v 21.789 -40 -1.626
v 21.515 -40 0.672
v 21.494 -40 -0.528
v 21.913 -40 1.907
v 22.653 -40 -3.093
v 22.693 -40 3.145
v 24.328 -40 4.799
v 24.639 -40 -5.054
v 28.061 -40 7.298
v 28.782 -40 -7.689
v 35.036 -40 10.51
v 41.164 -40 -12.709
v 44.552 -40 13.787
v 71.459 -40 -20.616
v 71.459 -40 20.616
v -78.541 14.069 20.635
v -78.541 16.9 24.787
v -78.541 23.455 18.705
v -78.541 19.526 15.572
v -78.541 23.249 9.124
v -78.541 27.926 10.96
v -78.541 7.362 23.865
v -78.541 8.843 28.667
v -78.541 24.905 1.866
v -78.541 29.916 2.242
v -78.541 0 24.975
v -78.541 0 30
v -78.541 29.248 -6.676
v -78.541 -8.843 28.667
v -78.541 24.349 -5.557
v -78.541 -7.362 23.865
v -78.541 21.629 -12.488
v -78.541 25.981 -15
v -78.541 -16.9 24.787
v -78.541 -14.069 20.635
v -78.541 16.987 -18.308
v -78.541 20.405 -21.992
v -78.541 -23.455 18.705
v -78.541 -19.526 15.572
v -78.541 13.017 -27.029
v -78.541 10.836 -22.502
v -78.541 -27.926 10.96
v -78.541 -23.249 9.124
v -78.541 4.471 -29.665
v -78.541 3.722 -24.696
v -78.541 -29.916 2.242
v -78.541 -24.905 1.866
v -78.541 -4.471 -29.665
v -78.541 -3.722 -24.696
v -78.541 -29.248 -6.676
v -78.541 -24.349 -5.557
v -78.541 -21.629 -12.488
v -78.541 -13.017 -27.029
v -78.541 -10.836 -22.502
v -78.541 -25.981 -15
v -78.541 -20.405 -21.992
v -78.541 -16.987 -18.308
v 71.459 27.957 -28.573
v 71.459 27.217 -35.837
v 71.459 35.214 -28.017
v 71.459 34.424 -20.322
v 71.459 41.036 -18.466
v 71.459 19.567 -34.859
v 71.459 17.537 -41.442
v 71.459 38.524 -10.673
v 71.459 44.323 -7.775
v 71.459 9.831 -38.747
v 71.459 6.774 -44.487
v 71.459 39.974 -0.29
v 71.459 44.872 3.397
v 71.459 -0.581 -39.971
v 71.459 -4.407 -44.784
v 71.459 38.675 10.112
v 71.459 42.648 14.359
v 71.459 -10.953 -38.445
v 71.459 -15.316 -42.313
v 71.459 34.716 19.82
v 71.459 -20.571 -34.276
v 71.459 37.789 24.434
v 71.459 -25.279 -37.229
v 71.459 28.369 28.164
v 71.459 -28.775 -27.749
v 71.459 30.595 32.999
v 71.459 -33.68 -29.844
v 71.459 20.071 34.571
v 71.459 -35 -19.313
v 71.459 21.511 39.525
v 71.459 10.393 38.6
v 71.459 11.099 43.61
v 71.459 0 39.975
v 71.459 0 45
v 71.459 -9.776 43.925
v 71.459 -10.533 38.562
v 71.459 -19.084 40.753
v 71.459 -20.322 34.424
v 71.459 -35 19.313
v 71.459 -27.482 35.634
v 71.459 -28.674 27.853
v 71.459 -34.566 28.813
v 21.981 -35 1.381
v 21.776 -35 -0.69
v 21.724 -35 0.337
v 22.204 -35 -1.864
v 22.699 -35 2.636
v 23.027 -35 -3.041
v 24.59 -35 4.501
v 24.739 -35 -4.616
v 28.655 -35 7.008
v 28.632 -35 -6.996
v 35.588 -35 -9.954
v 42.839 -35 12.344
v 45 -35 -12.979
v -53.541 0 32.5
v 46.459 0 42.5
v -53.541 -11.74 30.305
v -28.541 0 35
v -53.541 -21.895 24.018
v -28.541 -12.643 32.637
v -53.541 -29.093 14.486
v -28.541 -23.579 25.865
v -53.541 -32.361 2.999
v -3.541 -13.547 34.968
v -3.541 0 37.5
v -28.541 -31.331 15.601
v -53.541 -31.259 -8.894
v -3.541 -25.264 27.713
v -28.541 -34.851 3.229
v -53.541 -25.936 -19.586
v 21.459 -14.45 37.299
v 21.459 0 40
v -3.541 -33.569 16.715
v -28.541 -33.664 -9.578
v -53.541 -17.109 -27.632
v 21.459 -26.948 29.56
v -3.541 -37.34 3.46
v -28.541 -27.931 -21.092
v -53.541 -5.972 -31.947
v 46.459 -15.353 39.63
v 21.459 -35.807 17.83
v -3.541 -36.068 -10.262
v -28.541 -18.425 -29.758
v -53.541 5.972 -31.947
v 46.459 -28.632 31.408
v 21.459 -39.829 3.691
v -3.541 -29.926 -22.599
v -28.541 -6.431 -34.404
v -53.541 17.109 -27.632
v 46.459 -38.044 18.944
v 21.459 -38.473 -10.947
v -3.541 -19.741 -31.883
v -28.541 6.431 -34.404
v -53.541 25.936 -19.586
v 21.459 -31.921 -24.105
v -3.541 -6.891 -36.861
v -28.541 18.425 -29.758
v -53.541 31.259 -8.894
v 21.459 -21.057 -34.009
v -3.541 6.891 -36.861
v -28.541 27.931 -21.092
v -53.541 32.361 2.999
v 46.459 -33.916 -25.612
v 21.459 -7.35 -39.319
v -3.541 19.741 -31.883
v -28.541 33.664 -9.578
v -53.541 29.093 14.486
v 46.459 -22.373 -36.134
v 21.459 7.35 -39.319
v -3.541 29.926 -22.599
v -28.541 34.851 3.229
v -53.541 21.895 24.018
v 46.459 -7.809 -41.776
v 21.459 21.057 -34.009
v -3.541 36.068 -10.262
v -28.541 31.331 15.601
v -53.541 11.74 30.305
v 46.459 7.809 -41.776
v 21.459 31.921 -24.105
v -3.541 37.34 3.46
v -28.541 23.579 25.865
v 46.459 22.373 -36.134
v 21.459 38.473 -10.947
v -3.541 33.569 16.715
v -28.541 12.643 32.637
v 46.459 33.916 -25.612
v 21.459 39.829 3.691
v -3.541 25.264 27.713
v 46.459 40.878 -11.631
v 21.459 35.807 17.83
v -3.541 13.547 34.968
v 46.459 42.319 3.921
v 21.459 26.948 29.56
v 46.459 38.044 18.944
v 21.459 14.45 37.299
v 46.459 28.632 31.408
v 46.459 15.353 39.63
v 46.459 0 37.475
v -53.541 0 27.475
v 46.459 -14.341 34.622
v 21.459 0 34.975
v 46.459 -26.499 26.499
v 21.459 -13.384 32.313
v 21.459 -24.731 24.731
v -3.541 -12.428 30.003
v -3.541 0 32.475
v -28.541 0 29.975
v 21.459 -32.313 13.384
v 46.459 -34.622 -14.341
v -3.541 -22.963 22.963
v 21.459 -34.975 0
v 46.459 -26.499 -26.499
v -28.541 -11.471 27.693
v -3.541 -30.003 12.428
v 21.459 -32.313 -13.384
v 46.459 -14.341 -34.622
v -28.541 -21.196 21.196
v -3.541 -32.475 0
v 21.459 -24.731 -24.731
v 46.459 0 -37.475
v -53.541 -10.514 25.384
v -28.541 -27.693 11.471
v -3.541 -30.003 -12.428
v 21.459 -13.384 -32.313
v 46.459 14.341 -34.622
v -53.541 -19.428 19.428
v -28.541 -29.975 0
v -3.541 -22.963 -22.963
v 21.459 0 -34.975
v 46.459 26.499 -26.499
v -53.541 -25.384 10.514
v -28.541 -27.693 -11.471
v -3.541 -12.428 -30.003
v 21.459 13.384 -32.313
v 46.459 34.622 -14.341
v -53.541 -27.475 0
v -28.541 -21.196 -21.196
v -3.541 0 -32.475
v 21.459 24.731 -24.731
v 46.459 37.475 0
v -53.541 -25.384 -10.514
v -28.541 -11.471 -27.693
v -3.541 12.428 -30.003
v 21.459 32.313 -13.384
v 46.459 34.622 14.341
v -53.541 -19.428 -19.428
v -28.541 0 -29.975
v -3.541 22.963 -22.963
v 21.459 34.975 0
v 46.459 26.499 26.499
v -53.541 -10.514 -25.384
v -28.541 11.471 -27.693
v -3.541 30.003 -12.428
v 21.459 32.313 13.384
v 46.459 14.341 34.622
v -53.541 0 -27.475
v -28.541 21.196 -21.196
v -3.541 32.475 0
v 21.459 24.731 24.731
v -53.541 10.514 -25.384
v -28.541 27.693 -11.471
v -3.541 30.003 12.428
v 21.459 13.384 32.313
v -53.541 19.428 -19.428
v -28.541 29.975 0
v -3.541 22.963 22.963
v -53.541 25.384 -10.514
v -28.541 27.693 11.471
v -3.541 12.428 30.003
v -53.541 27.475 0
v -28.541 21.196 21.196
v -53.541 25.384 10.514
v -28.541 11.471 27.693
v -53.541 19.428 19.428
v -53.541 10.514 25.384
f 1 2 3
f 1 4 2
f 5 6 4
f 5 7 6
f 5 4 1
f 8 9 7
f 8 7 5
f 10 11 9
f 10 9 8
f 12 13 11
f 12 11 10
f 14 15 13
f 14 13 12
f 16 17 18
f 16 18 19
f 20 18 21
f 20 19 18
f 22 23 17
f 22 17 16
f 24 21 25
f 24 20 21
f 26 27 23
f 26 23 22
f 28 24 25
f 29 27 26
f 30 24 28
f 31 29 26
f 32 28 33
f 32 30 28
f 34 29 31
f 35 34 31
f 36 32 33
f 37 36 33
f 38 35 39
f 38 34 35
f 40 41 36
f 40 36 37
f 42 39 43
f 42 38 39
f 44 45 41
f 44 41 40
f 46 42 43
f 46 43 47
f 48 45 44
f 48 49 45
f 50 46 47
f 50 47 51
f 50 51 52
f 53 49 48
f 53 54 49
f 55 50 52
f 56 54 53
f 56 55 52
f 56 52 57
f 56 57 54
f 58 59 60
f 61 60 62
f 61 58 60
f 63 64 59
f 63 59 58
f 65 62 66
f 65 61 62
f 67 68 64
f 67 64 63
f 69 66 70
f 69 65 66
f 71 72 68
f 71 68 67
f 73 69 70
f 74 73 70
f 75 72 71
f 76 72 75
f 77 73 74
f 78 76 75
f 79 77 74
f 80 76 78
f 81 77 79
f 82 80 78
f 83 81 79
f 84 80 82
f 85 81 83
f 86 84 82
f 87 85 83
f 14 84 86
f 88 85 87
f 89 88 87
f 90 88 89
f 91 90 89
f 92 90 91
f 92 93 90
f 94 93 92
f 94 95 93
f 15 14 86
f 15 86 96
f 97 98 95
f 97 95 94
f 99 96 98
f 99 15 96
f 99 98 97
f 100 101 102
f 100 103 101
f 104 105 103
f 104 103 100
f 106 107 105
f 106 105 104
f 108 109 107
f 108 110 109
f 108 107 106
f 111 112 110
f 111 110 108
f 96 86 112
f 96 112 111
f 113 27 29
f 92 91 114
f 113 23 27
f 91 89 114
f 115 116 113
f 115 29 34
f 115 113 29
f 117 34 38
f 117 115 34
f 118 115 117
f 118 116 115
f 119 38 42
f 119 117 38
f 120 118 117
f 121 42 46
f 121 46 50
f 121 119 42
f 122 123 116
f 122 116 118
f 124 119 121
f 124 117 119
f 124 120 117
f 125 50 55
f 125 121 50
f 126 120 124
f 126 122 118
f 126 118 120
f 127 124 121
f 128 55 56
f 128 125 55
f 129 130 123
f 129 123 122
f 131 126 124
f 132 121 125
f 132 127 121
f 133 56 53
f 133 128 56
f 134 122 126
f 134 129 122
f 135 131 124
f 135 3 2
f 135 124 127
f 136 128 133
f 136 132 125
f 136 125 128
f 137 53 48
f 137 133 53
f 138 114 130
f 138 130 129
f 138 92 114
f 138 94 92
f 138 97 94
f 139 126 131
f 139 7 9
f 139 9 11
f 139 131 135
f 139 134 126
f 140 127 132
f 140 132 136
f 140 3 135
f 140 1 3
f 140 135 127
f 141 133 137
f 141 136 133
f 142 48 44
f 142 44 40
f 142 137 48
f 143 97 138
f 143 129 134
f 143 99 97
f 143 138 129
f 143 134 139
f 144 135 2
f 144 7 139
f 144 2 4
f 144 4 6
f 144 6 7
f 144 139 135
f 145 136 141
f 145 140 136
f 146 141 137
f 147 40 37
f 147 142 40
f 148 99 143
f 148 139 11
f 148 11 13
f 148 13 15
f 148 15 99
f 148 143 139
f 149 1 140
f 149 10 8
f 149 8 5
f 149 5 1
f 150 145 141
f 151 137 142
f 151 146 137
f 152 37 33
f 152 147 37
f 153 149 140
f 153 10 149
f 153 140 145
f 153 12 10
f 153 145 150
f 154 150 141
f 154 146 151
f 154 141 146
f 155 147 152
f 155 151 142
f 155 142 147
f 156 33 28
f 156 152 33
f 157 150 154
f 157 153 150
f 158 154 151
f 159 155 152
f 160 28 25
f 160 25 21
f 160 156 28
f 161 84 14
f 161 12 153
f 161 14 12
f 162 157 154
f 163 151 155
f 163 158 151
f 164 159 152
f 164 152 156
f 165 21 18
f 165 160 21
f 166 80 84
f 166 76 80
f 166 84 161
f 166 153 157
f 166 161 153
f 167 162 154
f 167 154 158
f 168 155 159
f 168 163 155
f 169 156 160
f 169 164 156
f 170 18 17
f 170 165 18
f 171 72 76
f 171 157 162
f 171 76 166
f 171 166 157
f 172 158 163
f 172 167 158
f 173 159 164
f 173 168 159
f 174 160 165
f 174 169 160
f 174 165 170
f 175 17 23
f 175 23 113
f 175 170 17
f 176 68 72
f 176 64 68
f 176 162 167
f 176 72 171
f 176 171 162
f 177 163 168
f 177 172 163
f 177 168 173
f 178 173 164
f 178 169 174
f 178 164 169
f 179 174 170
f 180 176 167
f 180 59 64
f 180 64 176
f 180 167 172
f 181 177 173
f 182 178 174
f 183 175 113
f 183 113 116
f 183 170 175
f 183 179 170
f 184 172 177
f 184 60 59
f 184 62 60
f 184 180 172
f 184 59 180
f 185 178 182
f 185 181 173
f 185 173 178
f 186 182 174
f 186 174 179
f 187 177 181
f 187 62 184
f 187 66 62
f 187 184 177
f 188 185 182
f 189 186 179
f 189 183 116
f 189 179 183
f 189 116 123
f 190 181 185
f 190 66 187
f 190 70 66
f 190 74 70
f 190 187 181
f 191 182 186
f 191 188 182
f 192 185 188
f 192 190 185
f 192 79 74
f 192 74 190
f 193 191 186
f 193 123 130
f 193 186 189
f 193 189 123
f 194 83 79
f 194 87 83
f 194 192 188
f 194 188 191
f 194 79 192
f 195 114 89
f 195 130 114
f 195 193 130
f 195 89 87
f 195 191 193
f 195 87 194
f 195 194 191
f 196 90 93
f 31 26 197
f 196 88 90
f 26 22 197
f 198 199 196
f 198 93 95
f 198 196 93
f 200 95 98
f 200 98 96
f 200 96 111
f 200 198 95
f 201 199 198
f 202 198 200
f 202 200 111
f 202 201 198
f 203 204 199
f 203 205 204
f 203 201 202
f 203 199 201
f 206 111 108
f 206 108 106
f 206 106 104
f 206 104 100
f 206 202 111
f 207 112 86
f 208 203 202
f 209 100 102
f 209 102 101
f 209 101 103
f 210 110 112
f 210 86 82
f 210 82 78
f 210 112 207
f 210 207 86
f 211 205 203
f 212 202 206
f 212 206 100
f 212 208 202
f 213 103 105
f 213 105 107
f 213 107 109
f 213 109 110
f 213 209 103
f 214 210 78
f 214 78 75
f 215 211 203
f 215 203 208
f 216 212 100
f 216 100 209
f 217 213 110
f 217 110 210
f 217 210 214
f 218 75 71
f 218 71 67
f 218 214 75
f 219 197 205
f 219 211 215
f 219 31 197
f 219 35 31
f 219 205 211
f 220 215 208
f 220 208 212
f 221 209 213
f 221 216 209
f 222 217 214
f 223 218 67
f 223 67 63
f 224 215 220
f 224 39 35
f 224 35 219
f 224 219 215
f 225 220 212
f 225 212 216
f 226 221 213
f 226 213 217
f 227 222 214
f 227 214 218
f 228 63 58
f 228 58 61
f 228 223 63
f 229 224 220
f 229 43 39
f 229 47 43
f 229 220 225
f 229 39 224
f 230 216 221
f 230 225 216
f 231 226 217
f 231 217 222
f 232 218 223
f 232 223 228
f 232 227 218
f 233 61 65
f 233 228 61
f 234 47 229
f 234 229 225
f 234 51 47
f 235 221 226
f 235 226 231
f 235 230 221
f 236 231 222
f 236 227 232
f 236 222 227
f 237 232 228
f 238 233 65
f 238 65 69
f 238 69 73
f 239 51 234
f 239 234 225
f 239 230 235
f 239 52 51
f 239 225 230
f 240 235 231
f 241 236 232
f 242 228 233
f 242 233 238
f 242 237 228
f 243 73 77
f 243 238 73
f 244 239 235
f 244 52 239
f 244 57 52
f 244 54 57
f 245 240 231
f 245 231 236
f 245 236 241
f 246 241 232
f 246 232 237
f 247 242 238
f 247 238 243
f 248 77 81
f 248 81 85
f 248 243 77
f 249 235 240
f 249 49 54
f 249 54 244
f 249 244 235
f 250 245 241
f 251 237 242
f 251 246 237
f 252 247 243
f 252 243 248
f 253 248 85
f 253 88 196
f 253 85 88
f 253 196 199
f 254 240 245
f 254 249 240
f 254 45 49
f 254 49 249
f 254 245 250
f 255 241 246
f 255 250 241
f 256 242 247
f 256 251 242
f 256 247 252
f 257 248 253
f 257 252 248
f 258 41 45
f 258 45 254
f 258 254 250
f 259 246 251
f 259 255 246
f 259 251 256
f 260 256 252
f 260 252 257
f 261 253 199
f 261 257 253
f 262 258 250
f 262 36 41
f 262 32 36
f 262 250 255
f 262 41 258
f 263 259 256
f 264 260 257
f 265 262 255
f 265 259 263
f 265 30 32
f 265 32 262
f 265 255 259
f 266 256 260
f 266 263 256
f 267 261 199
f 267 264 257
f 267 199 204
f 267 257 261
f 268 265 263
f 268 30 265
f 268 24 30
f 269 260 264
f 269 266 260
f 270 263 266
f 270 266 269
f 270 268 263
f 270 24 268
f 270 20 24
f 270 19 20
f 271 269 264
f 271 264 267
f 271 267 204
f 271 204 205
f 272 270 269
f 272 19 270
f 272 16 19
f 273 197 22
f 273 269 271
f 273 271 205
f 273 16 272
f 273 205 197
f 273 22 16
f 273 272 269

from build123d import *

# Parameters (mm, degrees)
BOSS_EXTRUDE1_REACH = 164.942
CUT_EXTRUDE1_DEPTH  = 163.941707368


with BuildPart() as part:
    # Sketch1 → Revolve1 (revolve)
    with BuildSketch(Plane.XY, mode=Mode.PRIVATE) as revolve1_sk:
        Polygon((-78.541169384, 30), (71.458830616, 45), (71.458830616, 39.975062189), (-78.541169384, 24.975062189), align=None)
    revolve(revolve1_sk.sketch.rotate(Axis((-78.541169384, 0, 0), (1, 0, 0)), 90), axis=Axis((-78.541169384, 0, 0), (1, 0, 0)))

    # Sketch3 → Boss-Extrude1 (add, up to next)
    with BuildSketch(Plane(origin=(71.458830616, 0, 0), x_dir=(0, 0, -1), z_dir=(1, 0, 0)), mode=Mode.PRIVATE) as boss_extrude1_sk1:
        with BuildLine():
            Line((-20.615528128, -40), (20.615528128, -40))
            ThreePointArc((20.615528128, -40), (24.577379737, -37.69552235), (28.284271247, -35))
            Line((28.284271247, -35), (-28.284271247, -35))
            ThreePointArc((-28.284271247, -35), (-24.577379737, -37.69552235), (-20.615528128, -40))
        make_face()
    boss_extrude1_tool1 = extrude(boss_extrude1_sk1.sketch, amount=-BOSS_EXTRUDE1_REACH, mode=Mode.PRIVATE) - part.part
    add(boss_extrude1_tool1.solids().sort_by_distance((71.458831, -37.37172, 0))[0])

    # Sketch4 → Cut-Extrude1 (cut, through all)
    with BuildSketch(Plane(origin=(71.458830616, 0, 0), x_dir=(0, 0, -1), z_dir=(1, 0, 0))):
        with BuildLine():
            Line((-20.615528128, -40), (20.615528128, -40))
            ThreePointArc((20.615528128, -40), (0, -45), (-20.615528128, -40))
        make_face()
    extrude(amount=-CUT_EXTRUDE1_DEPTH, mode=Mode.SUBTRACT)


solid = part.part
